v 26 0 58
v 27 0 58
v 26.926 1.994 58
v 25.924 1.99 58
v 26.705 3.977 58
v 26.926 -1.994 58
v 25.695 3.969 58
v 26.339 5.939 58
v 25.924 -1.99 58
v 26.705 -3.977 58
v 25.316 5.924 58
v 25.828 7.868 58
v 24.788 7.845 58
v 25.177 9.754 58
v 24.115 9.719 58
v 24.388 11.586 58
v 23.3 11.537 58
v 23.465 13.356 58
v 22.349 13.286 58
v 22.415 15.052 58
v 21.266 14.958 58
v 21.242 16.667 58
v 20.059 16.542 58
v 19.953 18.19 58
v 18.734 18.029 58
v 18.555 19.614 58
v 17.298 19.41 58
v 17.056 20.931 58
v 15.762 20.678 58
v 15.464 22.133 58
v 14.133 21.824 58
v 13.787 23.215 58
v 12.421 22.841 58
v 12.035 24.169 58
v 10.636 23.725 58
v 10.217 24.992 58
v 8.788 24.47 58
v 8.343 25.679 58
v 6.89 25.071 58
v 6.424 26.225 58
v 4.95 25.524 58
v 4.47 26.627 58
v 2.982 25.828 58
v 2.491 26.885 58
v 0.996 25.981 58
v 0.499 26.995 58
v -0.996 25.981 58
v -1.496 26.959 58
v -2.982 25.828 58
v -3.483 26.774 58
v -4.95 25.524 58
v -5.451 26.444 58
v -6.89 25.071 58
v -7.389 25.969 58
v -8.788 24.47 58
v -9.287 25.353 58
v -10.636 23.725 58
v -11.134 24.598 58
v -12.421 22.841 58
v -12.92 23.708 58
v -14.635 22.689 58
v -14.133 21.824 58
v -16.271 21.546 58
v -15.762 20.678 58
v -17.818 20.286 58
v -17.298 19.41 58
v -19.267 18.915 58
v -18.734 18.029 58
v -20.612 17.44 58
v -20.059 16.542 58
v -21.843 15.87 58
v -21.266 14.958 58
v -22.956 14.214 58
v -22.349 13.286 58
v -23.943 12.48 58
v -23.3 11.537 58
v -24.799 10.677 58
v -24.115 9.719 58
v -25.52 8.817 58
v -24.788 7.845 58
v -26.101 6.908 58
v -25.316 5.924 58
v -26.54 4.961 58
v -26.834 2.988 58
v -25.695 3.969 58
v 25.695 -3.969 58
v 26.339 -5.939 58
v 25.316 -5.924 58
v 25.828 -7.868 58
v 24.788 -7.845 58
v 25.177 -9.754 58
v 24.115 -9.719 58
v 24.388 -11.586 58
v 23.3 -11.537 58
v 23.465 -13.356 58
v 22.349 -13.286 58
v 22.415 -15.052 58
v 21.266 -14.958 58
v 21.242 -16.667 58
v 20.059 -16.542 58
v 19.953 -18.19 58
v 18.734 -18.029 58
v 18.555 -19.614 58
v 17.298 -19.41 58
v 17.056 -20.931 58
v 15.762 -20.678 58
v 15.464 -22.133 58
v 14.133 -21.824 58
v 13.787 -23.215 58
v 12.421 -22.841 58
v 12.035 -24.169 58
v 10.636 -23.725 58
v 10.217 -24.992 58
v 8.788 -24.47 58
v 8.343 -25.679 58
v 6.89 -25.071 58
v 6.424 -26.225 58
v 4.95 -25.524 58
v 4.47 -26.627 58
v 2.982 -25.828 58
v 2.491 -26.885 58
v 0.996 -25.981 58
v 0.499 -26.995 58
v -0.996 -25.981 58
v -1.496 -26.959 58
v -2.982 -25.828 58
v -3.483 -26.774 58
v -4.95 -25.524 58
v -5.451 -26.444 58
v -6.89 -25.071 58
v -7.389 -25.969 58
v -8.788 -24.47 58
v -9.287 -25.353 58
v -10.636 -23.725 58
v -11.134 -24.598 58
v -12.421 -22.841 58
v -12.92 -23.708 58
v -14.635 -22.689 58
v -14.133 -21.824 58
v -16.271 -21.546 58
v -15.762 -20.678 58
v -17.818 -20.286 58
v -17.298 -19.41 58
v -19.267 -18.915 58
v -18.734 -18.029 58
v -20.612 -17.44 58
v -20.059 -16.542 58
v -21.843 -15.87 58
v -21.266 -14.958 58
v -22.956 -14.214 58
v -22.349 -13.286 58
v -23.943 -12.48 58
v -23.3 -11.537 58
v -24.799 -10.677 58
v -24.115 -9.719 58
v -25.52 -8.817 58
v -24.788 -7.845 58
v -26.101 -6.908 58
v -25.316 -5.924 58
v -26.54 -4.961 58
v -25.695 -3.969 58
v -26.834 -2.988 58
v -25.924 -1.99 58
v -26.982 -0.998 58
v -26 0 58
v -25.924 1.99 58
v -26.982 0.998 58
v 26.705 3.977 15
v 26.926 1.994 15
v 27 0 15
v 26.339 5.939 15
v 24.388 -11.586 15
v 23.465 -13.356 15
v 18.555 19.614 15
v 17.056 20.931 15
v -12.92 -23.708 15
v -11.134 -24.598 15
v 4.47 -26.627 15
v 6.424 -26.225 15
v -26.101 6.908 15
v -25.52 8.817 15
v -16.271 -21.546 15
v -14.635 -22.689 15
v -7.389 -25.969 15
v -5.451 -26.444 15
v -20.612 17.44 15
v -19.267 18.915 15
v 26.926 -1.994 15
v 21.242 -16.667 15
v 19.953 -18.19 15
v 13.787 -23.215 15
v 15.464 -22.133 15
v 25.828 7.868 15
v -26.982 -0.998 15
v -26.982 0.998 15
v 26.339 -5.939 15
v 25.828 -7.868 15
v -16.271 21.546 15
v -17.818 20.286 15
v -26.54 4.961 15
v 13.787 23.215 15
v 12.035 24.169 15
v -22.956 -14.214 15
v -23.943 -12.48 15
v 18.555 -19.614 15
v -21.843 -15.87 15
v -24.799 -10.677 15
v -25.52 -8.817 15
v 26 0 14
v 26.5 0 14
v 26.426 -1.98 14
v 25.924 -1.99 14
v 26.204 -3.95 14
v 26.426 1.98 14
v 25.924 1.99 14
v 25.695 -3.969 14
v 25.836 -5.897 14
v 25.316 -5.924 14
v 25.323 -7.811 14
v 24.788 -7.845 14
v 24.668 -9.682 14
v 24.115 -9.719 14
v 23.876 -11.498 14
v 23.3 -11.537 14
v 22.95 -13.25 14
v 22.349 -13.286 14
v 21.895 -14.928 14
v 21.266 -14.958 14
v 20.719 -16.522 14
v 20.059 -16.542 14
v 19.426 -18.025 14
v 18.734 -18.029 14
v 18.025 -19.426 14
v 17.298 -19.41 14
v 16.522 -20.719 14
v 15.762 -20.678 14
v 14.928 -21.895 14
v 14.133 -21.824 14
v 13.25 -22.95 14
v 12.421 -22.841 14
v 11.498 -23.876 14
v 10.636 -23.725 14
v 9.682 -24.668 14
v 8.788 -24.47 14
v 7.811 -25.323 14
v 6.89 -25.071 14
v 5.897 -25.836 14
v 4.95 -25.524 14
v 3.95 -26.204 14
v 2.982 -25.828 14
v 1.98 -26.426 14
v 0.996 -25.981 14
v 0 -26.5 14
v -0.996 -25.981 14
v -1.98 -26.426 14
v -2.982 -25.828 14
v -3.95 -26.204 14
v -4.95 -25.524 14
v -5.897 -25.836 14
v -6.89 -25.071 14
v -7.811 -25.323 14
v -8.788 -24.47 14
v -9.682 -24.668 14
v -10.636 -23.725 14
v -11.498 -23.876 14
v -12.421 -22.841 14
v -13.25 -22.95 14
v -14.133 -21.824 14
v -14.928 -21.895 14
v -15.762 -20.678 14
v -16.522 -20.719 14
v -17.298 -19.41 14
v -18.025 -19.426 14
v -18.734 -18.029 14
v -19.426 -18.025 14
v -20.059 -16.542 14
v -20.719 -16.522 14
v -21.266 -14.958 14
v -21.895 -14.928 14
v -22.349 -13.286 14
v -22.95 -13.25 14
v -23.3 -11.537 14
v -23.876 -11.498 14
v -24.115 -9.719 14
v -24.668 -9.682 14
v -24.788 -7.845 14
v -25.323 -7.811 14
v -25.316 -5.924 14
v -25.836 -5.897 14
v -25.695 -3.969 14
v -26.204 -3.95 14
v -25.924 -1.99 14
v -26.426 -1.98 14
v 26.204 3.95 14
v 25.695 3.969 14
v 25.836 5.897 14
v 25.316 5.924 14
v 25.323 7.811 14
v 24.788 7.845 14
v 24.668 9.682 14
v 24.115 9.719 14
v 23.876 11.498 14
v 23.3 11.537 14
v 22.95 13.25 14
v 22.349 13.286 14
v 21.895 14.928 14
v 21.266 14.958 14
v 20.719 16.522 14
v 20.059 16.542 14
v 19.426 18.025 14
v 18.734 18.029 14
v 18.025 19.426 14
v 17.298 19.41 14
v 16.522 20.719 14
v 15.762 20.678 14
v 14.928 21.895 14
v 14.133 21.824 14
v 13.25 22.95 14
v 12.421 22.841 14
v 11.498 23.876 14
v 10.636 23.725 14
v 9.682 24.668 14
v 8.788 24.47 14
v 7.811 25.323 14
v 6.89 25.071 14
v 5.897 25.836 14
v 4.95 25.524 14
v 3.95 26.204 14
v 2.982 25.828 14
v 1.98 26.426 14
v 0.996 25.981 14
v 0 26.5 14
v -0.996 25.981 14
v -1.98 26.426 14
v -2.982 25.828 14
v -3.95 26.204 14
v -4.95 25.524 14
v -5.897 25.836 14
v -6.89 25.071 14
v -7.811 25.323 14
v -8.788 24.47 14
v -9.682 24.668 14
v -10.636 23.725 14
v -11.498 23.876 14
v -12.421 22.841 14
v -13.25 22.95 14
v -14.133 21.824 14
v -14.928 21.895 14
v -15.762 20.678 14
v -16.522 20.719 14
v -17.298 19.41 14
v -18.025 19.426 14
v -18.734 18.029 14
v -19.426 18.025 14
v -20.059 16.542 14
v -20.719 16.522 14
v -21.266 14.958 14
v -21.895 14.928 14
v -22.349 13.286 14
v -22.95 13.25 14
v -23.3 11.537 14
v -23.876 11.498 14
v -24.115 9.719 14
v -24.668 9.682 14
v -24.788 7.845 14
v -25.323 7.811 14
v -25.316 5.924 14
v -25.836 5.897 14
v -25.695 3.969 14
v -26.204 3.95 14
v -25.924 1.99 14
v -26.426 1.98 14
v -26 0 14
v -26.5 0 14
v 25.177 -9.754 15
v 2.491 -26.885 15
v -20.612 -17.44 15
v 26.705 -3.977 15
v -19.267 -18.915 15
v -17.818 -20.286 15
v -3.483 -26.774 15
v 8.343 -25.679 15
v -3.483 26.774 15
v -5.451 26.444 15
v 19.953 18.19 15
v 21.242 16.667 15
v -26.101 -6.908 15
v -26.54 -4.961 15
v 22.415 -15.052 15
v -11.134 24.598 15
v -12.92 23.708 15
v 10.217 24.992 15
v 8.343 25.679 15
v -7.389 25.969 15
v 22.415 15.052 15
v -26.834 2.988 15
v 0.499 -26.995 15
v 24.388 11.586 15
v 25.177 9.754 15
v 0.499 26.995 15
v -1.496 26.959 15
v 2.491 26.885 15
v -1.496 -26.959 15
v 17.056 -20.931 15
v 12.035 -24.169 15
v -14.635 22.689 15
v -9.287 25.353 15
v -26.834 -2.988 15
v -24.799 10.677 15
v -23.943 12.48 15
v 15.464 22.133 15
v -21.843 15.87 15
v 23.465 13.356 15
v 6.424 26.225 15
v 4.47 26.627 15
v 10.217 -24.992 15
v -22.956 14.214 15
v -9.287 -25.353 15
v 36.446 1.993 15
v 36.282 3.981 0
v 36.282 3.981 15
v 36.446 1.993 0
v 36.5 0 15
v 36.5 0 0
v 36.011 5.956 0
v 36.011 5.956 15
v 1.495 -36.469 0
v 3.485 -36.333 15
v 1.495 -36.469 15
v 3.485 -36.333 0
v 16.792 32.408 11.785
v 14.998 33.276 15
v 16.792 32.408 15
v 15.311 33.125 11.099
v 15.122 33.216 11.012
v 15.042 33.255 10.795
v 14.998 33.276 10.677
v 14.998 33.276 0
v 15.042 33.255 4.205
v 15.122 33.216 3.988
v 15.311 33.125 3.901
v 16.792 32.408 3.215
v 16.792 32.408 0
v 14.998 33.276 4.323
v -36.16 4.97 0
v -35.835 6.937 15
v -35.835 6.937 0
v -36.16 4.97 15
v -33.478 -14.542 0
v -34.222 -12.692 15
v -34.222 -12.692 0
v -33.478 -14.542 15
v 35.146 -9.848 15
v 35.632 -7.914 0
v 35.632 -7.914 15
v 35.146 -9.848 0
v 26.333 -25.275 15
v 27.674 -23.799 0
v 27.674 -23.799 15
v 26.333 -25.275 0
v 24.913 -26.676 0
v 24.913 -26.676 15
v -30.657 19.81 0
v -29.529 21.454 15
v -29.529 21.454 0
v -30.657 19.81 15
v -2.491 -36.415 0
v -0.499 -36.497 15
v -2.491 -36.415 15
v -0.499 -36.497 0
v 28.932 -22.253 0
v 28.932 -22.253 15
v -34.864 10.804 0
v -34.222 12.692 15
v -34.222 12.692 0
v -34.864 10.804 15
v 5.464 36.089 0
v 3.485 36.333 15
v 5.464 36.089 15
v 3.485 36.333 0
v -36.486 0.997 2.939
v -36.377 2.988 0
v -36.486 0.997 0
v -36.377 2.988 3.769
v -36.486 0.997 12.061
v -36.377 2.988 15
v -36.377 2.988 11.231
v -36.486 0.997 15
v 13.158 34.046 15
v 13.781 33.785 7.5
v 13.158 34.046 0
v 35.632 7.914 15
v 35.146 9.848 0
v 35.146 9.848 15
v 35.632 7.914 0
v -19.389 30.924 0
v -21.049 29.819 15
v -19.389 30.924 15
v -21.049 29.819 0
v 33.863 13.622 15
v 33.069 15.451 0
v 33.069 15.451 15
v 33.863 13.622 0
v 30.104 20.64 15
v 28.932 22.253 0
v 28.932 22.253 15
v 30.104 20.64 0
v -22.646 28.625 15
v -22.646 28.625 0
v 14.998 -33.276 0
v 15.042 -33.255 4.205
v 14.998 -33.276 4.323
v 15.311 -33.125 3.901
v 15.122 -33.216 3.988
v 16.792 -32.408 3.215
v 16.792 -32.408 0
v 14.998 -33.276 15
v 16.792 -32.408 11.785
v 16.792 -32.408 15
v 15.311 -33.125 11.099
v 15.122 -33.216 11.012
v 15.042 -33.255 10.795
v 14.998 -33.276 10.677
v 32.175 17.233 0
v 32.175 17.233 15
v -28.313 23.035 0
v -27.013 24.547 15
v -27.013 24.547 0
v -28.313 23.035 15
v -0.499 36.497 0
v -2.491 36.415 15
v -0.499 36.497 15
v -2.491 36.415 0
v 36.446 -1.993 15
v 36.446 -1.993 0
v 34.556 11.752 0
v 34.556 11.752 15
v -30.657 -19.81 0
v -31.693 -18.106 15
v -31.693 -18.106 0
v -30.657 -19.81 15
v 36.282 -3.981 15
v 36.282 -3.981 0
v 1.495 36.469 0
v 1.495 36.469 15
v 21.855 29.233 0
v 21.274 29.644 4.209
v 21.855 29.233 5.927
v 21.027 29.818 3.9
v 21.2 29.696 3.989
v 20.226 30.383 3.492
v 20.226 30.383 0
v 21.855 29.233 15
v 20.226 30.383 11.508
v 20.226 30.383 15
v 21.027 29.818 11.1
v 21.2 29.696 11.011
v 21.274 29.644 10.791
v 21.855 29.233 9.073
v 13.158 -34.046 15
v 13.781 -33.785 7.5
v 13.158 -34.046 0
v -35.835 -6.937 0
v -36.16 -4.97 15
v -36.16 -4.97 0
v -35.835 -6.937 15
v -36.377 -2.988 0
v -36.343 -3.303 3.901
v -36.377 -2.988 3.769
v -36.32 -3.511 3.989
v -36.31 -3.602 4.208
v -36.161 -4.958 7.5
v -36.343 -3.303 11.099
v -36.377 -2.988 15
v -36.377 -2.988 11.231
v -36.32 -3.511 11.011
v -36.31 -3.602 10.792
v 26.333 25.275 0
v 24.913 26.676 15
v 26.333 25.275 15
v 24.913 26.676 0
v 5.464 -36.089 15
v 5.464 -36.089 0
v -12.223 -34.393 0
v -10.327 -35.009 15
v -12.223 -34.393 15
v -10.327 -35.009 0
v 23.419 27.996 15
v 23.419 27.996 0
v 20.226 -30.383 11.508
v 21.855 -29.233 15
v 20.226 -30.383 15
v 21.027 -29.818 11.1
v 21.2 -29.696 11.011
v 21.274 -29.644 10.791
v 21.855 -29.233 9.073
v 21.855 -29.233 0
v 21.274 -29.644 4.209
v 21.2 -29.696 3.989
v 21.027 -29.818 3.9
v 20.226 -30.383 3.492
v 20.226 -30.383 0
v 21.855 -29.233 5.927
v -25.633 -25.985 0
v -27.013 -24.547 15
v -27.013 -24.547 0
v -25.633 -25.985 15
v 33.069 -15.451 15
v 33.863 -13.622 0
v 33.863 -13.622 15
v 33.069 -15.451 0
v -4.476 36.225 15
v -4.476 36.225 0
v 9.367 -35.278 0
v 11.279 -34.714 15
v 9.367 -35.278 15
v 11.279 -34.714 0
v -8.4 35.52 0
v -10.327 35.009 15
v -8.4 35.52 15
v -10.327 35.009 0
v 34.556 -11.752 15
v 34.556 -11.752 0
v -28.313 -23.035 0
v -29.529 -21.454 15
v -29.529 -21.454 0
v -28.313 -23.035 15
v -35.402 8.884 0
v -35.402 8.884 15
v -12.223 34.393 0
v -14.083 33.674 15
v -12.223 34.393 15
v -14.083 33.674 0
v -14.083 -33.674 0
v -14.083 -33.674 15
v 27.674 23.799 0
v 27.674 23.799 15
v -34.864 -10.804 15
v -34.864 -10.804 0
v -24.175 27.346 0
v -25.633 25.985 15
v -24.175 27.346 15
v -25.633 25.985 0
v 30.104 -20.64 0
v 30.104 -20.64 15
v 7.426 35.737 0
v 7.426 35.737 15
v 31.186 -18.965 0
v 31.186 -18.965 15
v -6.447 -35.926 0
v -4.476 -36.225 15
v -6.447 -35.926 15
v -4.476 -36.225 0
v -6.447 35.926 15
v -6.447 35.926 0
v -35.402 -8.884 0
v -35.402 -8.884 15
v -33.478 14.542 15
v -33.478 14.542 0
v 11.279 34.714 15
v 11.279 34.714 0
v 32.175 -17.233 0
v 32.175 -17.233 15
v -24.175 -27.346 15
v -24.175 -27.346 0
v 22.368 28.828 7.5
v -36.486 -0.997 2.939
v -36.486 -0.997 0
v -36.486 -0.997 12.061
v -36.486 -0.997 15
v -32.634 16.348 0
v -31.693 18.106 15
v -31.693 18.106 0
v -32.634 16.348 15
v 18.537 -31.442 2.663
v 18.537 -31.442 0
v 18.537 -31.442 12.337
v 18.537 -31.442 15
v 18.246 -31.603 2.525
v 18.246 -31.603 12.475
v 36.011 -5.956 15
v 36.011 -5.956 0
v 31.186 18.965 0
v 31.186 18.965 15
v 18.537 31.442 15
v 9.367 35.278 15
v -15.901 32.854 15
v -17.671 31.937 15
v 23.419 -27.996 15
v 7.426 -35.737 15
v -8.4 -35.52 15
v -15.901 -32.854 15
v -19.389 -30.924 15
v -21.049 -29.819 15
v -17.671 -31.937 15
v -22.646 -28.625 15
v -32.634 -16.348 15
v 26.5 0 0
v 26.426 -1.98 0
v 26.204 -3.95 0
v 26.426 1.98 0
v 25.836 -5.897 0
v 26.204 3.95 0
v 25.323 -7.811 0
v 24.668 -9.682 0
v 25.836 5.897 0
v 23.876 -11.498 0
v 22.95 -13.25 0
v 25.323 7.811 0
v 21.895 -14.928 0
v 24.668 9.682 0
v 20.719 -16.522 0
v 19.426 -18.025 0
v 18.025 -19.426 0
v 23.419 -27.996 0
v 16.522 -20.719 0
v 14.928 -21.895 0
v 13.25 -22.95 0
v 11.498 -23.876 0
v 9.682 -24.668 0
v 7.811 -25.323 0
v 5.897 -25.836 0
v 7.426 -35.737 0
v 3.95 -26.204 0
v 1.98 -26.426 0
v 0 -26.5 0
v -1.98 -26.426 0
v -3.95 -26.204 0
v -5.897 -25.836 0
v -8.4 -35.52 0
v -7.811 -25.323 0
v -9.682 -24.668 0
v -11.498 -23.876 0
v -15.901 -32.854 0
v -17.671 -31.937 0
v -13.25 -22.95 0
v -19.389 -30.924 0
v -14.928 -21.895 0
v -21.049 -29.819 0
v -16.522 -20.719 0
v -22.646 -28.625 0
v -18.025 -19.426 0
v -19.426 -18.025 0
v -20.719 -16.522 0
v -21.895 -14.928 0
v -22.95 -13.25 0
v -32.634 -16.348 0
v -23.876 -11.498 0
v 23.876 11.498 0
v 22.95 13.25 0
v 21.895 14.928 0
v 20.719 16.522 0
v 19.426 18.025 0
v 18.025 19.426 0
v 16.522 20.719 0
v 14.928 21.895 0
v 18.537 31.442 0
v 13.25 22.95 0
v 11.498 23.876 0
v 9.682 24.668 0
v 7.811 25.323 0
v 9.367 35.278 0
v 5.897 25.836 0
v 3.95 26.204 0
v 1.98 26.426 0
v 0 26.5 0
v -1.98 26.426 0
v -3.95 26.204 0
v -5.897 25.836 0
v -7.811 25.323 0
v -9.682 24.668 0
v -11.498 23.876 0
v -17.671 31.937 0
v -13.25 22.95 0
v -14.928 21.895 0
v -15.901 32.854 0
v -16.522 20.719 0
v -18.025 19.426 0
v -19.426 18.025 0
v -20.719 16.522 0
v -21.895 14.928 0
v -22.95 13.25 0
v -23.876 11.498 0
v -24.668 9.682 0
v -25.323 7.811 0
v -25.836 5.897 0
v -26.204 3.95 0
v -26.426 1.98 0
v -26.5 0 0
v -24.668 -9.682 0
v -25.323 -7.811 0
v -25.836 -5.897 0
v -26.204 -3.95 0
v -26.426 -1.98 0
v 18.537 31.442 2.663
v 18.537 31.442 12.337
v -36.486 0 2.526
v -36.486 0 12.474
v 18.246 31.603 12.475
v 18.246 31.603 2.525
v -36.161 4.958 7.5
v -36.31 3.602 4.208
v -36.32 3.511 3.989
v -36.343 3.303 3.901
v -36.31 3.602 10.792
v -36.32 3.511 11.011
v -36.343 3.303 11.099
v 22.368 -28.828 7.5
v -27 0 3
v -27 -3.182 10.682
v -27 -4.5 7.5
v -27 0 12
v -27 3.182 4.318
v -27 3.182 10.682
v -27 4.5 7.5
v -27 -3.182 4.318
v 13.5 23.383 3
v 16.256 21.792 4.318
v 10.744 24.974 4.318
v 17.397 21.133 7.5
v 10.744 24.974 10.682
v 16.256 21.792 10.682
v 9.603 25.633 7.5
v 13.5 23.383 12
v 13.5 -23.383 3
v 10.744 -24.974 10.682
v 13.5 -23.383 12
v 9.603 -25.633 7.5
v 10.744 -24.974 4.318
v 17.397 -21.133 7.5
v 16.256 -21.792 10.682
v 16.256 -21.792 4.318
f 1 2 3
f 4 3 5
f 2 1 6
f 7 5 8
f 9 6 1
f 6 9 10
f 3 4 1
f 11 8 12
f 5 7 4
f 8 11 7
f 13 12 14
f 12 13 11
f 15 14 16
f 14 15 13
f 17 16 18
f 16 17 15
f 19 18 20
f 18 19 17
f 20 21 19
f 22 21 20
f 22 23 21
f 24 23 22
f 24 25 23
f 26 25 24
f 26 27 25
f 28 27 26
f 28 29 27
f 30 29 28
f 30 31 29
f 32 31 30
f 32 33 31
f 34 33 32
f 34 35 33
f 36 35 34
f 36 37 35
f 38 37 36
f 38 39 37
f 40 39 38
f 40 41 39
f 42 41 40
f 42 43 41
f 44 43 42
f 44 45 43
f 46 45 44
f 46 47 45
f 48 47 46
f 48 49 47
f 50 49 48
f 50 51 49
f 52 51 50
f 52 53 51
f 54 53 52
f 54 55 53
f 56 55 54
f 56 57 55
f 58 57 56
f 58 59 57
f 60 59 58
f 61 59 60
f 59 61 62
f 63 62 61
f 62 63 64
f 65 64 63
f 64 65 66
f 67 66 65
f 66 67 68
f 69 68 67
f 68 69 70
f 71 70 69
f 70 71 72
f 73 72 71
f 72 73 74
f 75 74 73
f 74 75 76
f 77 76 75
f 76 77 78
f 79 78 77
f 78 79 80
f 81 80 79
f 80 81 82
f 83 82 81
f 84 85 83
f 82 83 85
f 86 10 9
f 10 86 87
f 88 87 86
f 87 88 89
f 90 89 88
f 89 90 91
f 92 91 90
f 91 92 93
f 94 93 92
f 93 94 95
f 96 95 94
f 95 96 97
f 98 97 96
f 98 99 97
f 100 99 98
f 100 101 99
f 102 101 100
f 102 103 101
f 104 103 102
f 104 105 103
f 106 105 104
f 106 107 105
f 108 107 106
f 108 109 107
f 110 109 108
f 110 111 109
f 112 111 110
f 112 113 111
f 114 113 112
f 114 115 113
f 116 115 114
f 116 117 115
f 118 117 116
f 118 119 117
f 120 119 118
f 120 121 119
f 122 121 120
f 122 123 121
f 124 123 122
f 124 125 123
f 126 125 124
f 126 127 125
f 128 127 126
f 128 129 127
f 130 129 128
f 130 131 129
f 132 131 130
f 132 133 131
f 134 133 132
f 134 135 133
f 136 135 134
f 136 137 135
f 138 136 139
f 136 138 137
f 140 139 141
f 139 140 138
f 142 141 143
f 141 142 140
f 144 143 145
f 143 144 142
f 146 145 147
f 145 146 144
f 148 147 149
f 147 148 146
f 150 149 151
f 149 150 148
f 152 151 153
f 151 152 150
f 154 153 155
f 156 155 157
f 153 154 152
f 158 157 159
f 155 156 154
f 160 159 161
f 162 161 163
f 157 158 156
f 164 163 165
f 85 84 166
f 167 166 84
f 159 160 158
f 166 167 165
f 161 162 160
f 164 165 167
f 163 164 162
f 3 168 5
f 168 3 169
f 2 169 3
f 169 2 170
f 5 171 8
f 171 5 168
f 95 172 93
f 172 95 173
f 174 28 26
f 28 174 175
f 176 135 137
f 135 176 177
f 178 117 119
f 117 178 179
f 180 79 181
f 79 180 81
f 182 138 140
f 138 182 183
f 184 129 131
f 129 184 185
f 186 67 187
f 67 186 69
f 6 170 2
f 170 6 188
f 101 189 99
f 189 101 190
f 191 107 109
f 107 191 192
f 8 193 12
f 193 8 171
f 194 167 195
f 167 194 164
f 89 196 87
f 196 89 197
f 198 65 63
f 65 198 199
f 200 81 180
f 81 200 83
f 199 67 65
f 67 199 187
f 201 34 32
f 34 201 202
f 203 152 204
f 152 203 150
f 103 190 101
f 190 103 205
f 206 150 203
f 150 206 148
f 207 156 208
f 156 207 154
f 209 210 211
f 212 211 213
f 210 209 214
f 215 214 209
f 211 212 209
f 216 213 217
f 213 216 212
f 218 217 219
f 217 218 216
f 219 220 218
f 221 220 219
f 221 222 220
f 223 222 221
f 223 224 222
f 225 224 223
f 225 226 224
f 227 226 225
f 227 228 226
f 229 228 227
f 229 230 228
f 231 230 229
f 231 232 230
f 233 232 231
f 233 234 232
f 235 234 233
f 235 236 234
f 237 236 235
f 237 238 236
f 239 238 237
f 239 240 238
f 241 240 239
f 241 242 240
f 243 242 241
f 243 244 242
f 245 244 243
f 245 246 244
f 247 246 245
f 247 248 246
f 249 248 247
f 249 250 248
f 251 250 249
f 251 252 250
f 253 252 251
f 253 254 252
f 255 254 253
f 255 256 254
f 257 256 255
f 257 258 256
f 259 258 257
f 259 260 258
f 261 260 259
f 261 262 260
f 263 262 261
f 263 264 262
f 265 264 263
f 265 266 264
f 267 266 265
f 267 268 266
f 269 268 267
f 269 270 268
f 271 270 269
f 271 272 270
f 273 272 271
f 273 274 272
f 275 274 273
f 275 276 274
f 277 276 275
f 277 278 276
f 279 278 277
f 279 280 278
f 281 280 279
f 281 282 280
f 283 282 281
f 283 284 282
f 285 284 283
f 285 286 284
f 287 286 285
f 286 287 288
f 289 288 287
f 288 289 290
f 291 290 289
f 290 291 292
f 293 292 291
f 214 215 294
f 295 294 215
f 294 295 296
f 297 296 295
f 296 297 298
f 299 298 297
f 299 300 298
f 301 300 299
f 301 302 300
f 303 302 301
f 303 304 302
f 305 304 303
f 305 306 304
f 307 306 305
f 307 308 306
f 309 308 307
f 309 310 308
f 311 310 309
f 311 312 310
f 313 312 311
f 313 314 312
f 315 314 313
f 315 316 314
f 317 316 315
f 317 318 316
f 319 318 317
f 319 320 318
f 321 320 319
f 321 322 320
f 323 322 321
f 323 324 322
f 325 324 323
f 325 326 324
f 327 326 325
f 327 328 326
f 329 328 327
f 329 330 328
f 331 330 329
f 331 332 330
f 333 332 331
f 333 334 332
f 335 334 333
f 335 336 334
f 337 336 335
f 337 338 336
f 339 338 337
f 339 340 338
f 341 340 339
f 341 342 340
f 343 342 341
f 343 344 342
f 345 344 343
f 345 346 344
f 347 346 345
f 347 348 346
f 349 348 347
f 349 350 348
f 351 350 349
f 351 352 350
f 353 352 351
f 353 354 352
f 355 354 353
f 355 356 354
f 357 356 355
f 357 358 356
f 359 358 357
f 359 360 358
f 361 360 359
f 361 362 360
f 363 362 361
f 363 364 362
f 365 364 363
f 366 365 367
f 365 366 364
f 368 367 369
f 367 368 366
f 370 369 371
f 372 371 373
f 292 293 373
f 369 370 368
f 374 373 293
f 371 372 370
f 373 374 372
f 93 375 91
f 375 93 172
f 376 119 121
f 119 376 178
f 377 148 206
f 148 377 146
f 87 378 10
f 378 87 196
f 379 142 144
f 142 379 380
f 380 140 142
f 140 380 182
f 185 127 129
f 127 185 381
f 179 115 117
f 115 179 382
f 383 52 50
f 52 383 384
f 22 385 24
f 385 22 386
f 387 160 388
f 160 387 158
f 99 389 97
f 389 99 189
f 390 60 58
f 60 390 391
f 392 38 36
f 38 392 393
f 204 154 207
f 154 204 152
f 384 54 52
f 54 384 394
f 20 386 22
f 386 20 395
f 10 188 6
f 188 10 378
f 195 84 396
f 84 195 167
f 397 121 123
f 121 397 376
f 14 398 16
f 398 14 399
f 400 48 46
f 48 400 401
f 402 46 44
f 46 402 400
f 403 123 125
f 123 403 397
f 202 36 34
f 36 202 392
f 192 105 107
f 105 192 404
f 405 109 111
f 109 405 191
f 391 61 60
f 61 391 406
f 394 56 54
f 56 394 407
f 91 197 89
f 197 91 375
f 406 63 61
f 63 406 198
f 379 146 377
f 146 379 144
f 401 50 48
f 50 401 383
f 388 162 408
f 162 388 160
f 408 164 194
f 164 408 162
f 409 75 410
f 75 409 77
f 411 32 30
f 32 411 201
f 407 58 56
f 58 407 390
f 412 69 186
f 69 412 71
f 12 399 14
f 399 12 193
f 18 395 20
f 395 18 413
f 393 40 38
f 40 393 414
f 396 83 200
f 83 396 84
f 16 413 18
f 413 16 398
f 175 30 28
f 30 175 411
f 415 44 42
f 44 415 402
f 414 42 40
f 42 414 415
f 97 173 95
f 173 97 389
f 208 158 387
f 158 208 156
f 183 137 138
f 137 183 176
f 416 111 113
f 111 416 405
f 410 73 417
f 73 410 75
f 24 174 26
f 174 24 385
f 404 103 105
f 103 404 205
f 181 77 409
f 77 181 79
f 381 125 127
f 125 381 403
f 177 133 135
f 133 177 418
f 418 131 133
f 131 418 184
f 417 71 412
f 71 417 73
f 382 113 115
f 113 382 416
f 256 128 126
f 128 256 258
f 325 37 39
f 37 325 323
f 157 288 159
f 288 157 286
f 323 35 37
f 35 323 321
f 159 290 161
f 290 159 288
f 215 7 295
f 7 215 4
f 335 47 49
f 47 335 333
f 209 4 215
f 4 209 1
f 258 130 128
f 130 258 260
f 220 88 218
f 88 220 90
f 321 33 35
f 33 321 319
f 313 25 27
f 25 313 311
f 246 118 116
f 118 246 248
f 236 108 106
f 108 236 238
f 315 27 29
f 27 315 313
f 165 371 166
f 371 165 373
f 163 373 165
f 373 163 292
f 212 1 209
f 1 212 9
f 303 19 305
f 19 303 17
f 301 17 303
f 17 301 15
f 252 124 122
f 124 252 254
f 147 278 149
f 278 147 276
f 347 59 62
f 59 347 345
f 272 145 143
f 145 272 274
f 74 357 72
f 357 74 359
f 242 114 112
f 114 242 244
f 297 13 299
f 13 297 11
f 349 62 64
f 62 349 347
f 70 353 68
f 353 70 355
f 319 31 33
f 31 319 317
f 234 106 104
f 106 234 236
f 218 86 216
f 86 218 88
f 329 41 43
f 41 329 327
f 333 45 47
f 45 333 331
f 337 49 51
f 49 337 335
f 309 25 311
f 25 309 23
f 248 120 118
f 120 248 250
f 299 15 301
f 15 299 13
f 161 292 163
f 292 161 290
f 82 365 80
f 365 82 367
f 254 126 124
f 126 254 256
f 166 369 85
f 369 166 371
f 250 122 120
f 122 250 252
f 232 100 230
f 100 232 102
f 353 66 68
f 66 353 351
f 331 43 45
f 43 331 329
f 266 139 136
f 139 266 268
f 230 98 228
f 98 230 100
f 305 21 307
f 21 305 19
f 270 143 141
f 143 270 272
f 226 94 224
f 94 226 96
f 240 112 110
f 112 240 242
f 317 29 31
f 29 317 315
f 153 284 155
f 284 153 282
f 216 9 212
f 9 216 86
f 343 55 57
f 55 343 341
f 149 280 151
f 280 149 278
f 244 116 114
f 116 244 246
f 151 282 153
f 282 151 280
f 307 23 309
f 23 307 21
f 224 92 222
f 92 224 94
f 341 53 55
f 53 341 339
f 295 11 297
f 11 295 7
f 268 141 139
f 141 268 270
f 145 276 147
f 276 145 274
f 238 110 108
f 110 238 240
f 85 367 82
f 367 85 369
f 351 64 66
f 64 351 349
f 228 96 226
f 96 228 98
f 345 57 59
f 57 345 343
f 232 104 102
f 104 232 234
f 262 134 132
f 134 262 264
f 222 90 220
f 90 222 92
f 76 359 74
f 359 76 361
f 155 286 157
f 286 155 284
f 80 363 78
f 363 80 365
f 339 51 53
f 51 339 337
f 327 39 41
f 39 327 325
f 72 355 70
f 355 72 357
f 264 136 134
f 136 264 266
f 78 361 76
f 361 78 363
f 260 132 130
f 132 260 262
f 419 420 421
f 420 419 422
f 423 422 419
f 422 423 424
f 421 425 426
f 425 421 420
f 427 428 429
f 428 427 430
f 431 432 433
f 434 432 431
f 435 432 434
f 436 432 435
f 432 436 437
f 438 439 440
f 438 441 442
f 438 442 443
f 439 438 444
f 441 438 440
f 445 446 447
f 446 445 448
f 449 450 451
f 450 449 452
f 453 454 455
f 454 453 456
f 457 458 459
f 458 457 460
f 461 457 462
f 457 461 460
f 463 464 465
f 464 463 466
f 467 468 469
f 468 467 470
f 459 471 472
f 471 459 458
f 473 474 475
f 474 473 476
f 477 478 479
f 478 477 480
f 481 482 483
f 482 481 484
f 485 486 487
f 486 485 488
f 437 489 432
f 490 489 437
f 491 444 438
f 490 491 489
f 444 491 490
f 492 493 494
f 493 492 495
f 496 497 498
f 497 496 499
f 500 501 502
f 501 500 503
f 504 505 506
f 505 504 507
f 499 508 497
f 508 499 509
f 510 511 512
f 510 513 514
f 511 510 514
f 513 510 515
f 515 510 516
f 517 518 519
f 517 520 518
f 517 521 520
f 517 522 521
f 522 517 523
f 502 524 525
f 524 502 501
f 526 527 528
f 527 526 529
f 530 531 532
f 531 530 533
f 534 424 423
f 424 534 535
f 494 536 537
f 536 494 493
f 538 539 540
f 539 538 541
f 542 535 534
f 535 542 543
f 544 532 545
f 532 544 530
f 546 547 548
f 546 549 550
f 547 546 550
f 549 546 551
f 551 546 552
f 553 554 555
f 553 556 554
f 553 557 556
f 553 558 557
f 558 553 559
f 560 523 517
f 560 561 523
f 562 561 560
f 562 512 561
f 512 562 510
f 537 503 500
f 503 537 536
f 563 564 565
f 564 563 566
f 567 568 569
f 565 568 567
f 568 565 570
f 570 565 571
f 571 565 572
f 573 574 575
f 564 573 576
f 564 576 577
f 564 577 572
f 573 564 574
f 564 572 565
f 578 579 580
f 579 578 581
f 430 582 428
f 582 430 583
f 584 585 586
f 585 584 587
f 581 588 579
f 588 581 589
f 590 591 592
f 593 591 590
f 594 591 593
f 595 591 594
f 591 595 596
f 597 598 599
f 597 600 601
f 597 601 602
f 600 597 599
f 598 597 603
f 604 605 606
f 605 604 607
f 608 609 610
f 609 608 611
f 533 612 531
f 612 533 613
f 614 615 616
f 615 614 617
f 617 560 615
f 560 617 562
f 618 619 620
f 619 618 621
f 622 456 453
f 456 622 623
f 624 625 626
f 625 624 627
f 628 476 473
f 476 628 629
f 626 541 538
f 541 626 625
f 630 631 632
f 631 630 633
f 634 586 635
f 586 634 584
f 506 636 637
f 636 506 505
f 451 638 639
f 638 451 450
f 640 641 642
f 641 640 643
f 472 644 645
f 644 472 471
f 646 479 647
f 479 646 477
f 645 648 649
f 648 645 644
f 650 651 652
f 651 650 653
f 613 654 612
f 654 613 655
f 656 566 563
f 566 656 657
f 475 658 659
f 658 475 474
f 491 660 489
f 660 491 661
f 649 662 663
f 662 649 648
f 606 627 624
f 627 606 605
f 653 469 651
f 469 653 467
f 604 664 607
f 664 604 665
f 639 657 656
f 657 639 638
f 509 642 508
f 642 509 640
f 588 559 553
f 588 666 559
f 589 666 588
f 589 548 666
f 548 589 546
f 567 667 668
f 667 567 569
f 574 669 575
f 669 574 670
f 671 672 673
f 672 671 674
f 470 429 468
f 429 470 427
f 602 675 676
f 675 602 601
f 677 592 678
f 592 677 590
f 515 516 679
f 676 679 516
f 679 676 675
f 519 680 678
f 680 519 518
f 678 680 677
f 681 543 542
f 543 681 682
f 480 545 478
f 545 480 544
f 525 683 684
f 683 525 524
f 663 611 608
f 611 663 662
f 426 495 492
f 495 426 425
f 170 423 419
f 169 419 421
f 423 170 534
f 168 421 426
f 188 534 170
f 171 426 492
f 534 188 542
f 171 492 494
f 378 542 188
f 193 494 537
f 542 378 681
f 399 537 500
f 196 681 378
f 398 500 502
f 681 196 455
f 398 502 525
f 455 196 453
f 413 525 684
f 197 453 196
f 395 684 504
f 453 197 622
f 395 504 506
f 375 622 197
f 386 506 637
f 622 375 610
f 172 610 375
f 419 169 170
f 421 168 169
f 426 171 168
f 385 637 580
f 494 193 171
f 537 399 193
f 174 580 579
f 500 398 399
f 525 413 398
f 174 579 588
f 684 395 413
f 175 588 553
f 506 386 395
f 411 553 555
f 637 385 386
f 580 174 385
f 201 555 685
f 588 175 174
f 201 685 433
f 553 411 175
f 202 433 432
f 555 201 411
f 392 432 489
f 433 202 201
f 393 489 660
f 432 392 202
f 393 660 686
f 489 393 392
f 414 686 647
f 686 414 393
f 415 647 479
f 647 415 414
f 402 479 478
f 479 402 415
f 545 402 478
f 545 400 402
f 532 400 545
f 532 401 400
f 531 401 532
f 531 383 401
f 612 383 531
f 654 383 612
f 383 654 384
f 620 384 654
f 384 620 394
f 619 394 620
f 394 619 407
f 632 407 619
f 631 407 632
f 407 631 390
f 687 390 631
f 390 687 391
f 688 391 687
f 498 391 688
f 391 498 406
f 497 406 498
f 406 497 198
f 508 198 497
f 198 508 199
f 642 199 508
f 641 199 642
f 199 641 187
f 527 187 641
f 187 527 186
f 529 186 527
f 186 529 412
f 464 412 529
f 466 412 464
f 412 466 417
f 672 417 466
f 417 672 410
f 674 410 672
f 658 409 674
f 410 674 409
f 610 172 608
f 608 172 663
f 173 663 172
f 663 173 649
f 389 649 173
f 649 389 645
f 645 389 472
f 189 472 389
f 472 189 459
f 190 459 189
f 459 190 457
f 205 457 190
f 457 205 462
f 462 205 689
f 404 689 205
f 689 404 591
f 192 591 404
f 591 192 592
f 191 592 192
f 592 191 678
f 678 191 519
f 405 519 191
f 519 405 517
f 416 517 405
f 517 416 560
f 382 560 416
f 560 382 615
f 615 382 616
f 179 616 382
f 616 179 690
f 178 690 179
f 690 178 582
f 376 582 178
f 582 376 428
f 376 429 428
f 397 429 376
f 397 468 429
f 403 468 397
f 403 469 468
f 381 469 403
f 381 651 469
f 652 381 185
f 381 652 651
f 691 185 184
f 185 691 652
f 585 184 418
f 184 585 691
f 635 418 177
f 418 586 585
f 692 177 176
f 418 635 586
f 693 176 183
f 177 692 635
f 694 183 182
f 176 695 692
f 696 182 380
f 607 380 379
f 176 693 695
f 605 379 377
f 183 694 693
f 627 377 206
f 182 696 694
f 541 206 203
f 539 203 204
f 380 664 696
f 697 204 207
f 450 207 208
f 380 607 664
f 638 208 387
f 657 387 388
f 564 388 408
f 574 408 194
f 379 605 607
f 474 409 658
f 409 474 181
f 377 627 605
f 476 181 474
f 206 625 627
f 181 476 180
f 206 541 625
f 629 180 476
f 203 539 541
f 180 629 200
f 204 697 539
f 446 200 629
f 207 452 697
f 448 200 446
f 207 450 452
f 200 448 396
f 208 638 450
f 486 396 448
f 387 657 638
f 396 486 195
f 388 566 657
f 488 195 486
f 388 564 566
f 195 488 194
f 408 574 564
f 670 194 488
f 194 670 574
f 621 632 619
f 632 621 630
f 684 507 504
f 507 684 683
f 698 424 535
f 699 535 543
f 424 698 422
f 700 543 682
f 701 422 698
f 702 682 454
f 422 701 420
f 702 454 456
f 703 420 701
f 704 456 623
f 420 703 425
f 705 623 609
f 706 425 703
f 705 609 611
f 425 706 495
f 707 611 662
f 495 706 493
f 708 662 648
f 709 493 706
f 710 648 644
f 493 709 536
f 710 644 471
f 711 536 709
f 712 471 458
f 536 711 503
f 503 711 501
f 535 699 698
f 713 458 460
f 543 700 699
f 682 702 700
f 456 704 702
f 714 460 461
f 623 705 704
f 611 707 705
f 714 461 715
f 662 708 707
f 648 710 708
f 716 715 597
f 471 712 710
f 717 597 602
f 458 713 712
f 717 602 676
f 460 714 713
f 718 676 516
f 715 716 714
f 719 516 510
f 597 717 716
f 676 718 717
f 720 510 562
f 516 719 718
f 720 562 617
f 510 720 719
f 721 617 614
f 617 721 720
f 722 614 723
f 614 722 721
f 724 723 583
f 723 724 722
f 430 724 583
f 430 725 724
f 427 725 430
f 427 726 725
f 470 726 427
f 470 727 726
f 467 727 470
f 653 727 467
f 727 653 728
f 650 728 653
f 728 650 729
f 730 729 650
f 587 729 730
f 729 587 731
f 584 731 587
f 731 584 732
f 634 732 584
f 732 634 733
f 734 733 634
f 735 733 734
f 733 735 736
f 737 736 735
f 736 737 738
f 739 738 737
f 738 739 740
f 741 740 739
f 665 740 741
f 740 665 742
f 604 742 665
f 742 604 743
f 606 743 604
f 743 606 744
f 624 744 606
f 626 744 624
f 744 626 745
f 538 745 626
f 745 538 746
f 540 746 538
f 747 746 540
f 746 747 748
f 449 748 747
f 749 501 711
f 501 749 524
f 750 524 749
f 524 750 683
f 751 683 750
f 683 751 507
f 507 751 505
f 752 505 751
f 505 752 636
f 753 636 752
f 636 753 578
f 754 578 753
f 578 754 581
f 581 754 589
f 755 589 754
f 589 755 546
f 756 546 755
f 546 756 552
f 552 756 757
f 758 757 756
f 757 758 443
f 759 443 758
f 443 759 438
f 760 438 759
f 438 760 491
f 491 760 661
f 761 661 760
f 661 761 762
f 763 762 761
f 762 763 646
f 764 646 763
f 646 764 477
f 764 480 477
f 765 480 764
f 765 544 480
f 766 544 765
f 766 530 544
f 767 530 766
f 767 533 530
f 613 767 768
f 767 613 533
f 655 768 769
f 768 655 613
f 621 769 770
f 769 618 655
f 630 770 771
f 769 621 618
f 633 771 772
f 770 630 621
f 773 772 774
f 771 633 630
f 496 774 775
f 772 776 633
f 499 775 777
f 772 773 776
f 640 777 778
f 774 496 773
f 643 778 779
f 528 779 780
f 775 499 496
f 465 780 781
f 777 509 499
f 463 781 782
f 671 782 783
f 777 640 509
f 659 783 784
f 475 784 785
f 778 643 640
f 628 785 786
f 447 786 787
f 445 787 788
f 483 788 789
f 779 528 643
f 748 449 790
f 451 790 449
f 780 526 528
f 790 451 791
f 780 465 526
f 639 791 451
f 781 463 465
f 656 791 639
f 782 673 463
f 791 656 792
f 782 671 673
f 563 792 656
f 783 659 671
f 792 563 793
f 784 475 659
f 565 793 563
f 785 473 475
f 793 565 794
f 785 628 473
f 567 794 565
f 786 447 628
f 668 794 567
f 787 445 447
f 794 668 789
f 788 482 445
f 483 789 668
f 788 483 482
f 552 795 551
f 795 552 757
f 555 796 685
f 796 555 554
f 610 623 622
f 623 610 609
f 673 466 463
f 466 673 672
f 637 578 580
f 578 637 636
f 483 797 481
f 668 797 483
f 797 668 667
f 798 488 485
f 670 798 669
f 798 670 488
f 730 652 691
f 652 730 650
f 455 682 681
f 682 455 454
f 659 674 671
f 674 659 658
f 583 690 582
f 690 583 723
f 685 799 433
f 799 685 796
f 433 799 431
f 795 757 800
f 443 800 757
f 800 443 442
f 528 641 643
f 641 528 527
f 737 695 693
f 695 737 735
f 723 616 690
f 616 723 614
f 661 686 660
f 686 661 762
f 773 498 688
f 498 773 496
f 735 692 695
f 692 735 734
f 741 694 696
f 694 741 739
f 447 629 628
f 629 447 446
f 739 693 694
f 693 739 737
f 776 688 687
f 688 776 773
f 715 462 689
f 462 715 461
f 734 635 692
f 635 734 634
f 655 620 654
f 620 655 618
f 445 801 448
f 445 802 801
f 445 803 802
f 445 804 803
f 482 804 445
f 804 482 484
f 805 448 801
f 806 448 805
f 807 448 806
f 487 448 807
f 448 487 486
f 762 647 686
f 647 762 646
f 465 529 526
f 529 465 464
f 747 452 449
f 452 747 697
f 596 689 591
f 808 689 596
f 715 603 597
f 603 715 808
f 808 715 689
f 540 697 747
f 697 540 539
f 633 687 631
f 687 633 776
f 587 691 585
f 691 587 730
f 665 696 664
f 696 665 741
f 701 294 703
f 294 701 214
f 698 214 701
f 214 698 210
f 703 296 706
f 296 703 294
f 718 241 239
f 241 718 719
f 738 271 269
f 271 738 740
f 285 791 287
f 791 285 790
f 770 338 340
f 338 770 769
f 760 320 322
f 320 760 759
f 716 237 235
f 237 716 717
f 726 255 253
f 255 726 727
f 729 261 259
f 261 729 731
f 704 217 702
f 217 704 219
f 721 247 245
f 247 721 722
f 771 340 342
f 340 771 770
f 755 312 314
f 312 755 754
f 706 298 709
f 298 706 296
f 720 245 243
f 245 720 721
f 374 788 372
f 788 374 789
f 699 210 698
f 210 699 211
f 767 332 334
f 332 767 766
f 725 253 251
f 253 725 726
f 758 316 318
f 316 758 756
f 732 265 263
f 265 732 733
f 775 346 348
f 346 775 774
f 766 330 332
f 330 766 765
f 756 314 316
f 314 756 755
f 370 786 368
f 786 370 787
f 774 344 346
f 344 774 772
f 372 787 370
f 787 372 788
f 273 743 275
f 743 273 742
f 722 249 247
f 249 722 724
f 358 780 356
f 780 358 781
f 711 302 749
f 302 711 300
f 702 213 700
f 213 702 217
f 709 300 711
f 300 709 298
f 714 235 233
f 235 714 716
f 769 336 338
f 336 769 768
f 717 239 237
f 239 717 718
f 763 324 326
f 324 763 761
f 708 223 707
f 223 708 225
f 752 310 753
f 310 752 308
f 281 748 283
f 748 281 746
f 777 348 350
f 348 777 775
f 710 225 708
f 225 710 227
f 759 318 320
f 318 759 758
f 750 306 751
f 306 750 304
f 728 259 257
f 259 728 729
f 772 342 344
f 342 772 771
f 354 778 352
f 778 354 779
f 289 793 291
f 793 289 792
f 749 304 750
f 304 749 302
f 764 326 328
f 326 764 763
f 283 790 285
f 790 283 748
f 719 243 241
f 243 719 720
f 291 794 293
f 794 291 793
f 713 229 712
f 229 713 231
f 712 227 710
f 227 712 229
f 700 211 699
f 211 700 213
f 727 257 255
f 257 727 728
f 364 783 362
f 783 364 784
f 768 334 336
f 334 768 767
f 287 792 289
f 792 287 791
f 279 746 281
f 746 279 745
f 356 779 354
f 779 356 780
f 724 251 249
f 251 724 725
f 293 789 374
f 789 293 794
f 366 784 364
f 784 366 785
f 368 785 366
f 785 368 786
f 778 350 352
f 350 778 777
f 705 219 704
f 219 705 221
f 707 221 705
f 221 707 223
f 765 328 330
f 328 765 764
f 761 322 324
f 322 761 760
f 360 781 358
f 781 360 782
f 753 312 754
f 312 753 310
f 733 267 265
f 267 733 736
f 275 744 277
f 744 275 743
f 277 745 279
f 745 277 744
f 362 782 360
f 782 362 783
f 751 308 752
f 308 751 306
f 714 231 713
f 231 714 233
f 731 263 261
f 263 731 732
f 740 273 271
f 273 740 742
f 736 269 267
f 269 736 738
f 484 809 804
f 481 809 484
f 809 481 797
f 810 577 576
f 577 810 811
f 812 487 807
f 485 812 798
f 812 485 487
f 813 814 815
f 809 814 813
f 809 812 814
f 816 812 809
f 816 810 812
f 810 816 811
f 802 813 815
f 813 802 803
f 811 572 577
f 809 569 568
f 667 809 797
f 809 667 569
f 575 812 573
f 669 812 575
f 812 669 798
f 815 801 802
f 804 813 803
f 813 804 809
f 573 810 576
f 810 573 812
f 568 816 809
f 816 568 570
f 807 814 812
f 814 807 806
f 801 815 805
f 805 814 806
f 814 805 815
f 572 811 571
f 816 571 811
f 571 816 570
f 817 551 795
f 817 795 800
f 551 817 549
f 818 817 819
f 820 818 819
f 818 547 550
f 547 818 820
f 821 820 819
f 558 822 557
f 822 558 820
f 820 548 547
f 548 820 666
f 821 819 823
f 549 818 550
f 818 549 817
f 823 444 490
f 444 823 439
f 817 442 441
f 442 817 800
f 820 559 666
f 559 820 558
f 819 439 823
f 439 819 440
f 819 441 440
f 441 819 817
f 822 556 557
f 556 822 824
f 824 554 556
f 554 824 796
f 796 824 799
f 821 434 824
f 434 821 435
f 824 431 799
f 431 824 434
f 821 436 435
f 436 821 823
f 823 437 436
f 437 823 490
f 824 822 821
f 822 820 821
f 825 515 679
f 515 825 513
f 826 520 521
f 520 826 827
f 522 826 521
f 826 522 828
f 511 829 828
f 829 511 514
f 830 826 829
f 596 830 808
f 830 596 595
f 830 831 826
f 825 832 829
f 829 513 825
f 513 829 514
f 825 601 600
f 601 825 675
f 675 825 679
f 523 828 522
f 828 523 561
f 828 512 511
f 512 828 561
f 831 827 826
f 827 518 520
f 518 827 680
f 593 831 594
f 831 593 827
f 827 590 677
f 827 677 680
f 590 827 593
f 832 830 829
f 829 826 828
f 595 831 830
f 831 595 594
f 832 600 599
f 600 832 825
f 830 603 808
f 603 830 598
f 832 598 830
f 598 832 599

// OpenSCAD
// Loose filament spindle.
// ======================
//
// This spindle is designed to insert into a loose spool of filament and spin
// around a provided axis either on the back of a Replicator or externally.
//
// Terminology:
//
//	Hub - centre support for the spindle - has embedded spokes.
//	Centre Hole - the hole in the centre of the hub.
//	Spoke - the spoke connecting the hub to the bracket.
//	Bracket - the outer support structure designed to hold the spool of filament.
//	Plug - the nub of plastic which inserts into plug holes in the spindle
// 		or the spokes.
//
// Notes:
//
//	Check that you can assemble a full set of 3 spokes and brackets which
//	will fit loosely inside the spool of filament.
//
//	The idea is to NOT stretch the filament inserting the full hub.   There
///  is a need for loose filament to have some room to move as it unwinds. 
//
//	Use the following sequence for insertion:
//
//		1) Insert one spoke/bracket set into the hub and insert this
//			into the spool of filament.
//		2) Insert the second spoke/bracket set into the spool of
//			filament and then into the hub.
//		3) Insert the second spoke/bracket set into the spool of
//			filament and then tilting the hub up slightly insert
//			into the final plug hole on the hub.
//
//	You should print Brackets with support (for the plug).
//	You should print Hubs with support (for the plug holes).
//	Print Spokes vertically at 100% - NO support is best. Horizontally
//		printed spokes will split.

/* [Global] */

// Which part are you going to build?
part = "Hub"; // [Hub:Hub, Spoke:Spoke, Bracket:Bracket]

/* [Hub] */

// Use External if you are not printing for the back of a Replicator.
Hub_Type = "Replicator"; // [Replicator, External]

// Use 52 for Replicator.
Centre_Hole_Diameter = 52; // [20:80]

// Use 15 for Replicator.
Hub_Thickness = 15; // [15:50]

/* [Spoke] */

// Use 20 as a starting point for replicator hub.
Spoke_Length =  20; // [10:100]

/* [Bracket] */

// Use 50 for Replicator.
Bracket_Diameter = 50;  // [20:50]

// Use 10 for Replicator.
Bracket_Thickness = 10;

// Use 8 for Replicator.
Bracket_Depth = 8 ;

// in units of Bracket_Thickness. Use 1 for Replicator.
Bracket_Prong_Length = 1.0;  // [1,2,3,4]

/* [Hidden] */
     
Angular_Resolution = 0.1;
Octagon_Resolution = 45 ;
Decagon_Resolution = 36 ;

Plug_Height = 10;  // plug height
Plug_Hole_Width = 10;  // plug hole width
Plug_Wall_Thickness = 3;   // plug wall thickness
Plug_Taper = 0.5; // Plug_Taper of plug in mm
Plug_Clearance = 0.15; // Difference between plug and plughole diameters

Filiament_Hole = 4;  // Hole in bracket when storing filament.

/////////////////////////////////////////////////////////////////////////////////////////////////////////////////

print_part();

module print_part() {	
	if (part == "Hub") {
		Hub();
	} else if (part == "Spoke") {
		Spoke();
	} else {
		Bracket();
	}
}

module highlight(this_tab) {
  if (preview_tab == this_tab) {
    color("red") child(0);
  } else {
    child(0);
  }
}

module Hub() {

	Hole_Offset = Hub_Thickness*.5*-1;
	Plug_Offset = ((Centre_Hole_Diameter/2) + Plug_Height+1)*-1;  // Add 1 to offset for Repg <<<<<<<<<<<<<
	
// Spacer for Replicator.
	if (Hub_Type == "Replicator") {
		translate([0,0,Hub_Thickness-1]) tube(44,(Centre_Hole_Diameter+2)/2.0,1); // For inside ring.
	}

// Main Hub	
	difference() {
		tube(Hub_Thickness,(Centre_Hole_Diameter + 1 + (Plug_Height*2))/2.0,Plug_Height);  // Add 1 to radius for Repg <<<<<<<<<<<

// Radial Holes.
		union(){
			rotate([0,90,0]) translate([Hole_Offset,0,Plug_Offset])   plugHole();
			rotate([120,90,0]) translate([Hole_Offset,0,Plug_Offset])   plugHole();
			rotate([240,90,0]) translate([Hole_Offset,0,Plug_Offset])   plugHole();
		}
	}
}

module tube(height, radius, wall) {
	difference(){
		cylinder(height, radius, radius, $fa=Angular_Resolution);
		cylinder(height, radius-wall, radius-wall, $fa=Angular_Resolution);
	}
}

module octagontube(height, radius, wall) {
	difference(){
		cylinder(height, radius, radius, $fa=Octagon_Resolution);
		cylinder(height, radius-wall, radius-wall, $fa=Octagon_Resolution);
	}
}

module decagontube(height, radius, wall) {
	difference(){
		cylinder(height, radius, radius, $fa=Decagon_Resolution);
		cylinder(height, radius-wall, radius-wall, $fa=Decagon_Resolution);
	}
}

module plugHole() {
      cylinder(Plug_Height,Plug_Hole_Width/2,Plug_Hole_Width/2 - Plug_Taper,$fa=Octagon_Resolution);
}

module plug() {
      cylinder(Plug_Height,(Plug_Hole_Width-Plug_Clearance)/2,(Plug_Hole_Width-Plug_Clearance)/2 - Plug_Taper,$fa=Octagon_Resolution);
}

module Spoke() {
	difference() {
		union() {
  			octagontube(Spoke_Length,(Plug_Hole_Width+Plug_Wall_Thickness)/2,Plug_Wall_Thickness*2/2,$fa=Octagon_Resolution);
  			translate([0,0,Spoke_Length*0.99]) plug();
		}
		plugHole();
	}
}

module Bracket_Build(diameter, thickness, depth, length){

	difference() {

		union() {

// Build half a decagon tube as base for bracket.
			rotate([90,0,0])
			difference(){
				decagontube(thickness, diameter, depth) ;
				translate([diameter*-1,diameter*-1,0]) cube([diameter*2,diameter,thickness]);
			} 

// Extend Forks.
    			if (length > 1 ) {
				translate([diameter*-0.99,thickness*-1,thickness*(length-1)*-0.99]) cube([thickness*0.75,thickness,thickness*(length-1)]);
   	 			translate([diameter-(thickness*0.75),thickness*-1,thickness*(length-1)*-0.99]) cube([thickness*0.75,thickness,thickness*(length-1)]);
    			}

// Add rounded top to forks.
			rotate([90,0,0]) translate([diameter*-0.91,(thickness*(length-1)*-1) + (thickness*-0.10),0]) cylinder(thickness,thickness/2,thickness/2,$fa=Angular_Resolution);
			rotate([90,0,0]) translate([diameter*0.91,(thickness*(length-1)*-1) + (thickness*-0.10),0]) cylinder(thickness,thickness/2,thickness/2,$fa=Angular_Resolution);

// Add Plug to top.	
     		translate([thickness*-1,thickness*-1,diameter*0.95])cube([thickness*2,thickness,thickness/4]);
			translate([0,thickness/2*-1,diameter])plug();
		} // Union

// Insert filament holes.
		union() {
          	rotate([90,0,0]) translate([diameter*-0.91,(thickness*(length-1)*-1) + (thickness*-0.10),0]) cylinder(thickness,Filiament_Hole/2,Filiament_Hole/2,$fa=Angular_Resolution);
			rotate([90,0,0]) translate([diameter*0.91,(thickness*(length-1)*-1) + (thickness*-0.10),0]) cylinder(thickness,Filiament_Hole/2,Filiament_Hole/2,$fa=Angular_Resolution);
		}
	} //difference
}

module Bracket(){

	rotate([90,0,0]) translate([0,Bracket_Thickness,0]) Bracket_Build(Bracket_Diameter, Bracket_Thickness, Bracket_Depth, Bracket_Prong_Length);
}
